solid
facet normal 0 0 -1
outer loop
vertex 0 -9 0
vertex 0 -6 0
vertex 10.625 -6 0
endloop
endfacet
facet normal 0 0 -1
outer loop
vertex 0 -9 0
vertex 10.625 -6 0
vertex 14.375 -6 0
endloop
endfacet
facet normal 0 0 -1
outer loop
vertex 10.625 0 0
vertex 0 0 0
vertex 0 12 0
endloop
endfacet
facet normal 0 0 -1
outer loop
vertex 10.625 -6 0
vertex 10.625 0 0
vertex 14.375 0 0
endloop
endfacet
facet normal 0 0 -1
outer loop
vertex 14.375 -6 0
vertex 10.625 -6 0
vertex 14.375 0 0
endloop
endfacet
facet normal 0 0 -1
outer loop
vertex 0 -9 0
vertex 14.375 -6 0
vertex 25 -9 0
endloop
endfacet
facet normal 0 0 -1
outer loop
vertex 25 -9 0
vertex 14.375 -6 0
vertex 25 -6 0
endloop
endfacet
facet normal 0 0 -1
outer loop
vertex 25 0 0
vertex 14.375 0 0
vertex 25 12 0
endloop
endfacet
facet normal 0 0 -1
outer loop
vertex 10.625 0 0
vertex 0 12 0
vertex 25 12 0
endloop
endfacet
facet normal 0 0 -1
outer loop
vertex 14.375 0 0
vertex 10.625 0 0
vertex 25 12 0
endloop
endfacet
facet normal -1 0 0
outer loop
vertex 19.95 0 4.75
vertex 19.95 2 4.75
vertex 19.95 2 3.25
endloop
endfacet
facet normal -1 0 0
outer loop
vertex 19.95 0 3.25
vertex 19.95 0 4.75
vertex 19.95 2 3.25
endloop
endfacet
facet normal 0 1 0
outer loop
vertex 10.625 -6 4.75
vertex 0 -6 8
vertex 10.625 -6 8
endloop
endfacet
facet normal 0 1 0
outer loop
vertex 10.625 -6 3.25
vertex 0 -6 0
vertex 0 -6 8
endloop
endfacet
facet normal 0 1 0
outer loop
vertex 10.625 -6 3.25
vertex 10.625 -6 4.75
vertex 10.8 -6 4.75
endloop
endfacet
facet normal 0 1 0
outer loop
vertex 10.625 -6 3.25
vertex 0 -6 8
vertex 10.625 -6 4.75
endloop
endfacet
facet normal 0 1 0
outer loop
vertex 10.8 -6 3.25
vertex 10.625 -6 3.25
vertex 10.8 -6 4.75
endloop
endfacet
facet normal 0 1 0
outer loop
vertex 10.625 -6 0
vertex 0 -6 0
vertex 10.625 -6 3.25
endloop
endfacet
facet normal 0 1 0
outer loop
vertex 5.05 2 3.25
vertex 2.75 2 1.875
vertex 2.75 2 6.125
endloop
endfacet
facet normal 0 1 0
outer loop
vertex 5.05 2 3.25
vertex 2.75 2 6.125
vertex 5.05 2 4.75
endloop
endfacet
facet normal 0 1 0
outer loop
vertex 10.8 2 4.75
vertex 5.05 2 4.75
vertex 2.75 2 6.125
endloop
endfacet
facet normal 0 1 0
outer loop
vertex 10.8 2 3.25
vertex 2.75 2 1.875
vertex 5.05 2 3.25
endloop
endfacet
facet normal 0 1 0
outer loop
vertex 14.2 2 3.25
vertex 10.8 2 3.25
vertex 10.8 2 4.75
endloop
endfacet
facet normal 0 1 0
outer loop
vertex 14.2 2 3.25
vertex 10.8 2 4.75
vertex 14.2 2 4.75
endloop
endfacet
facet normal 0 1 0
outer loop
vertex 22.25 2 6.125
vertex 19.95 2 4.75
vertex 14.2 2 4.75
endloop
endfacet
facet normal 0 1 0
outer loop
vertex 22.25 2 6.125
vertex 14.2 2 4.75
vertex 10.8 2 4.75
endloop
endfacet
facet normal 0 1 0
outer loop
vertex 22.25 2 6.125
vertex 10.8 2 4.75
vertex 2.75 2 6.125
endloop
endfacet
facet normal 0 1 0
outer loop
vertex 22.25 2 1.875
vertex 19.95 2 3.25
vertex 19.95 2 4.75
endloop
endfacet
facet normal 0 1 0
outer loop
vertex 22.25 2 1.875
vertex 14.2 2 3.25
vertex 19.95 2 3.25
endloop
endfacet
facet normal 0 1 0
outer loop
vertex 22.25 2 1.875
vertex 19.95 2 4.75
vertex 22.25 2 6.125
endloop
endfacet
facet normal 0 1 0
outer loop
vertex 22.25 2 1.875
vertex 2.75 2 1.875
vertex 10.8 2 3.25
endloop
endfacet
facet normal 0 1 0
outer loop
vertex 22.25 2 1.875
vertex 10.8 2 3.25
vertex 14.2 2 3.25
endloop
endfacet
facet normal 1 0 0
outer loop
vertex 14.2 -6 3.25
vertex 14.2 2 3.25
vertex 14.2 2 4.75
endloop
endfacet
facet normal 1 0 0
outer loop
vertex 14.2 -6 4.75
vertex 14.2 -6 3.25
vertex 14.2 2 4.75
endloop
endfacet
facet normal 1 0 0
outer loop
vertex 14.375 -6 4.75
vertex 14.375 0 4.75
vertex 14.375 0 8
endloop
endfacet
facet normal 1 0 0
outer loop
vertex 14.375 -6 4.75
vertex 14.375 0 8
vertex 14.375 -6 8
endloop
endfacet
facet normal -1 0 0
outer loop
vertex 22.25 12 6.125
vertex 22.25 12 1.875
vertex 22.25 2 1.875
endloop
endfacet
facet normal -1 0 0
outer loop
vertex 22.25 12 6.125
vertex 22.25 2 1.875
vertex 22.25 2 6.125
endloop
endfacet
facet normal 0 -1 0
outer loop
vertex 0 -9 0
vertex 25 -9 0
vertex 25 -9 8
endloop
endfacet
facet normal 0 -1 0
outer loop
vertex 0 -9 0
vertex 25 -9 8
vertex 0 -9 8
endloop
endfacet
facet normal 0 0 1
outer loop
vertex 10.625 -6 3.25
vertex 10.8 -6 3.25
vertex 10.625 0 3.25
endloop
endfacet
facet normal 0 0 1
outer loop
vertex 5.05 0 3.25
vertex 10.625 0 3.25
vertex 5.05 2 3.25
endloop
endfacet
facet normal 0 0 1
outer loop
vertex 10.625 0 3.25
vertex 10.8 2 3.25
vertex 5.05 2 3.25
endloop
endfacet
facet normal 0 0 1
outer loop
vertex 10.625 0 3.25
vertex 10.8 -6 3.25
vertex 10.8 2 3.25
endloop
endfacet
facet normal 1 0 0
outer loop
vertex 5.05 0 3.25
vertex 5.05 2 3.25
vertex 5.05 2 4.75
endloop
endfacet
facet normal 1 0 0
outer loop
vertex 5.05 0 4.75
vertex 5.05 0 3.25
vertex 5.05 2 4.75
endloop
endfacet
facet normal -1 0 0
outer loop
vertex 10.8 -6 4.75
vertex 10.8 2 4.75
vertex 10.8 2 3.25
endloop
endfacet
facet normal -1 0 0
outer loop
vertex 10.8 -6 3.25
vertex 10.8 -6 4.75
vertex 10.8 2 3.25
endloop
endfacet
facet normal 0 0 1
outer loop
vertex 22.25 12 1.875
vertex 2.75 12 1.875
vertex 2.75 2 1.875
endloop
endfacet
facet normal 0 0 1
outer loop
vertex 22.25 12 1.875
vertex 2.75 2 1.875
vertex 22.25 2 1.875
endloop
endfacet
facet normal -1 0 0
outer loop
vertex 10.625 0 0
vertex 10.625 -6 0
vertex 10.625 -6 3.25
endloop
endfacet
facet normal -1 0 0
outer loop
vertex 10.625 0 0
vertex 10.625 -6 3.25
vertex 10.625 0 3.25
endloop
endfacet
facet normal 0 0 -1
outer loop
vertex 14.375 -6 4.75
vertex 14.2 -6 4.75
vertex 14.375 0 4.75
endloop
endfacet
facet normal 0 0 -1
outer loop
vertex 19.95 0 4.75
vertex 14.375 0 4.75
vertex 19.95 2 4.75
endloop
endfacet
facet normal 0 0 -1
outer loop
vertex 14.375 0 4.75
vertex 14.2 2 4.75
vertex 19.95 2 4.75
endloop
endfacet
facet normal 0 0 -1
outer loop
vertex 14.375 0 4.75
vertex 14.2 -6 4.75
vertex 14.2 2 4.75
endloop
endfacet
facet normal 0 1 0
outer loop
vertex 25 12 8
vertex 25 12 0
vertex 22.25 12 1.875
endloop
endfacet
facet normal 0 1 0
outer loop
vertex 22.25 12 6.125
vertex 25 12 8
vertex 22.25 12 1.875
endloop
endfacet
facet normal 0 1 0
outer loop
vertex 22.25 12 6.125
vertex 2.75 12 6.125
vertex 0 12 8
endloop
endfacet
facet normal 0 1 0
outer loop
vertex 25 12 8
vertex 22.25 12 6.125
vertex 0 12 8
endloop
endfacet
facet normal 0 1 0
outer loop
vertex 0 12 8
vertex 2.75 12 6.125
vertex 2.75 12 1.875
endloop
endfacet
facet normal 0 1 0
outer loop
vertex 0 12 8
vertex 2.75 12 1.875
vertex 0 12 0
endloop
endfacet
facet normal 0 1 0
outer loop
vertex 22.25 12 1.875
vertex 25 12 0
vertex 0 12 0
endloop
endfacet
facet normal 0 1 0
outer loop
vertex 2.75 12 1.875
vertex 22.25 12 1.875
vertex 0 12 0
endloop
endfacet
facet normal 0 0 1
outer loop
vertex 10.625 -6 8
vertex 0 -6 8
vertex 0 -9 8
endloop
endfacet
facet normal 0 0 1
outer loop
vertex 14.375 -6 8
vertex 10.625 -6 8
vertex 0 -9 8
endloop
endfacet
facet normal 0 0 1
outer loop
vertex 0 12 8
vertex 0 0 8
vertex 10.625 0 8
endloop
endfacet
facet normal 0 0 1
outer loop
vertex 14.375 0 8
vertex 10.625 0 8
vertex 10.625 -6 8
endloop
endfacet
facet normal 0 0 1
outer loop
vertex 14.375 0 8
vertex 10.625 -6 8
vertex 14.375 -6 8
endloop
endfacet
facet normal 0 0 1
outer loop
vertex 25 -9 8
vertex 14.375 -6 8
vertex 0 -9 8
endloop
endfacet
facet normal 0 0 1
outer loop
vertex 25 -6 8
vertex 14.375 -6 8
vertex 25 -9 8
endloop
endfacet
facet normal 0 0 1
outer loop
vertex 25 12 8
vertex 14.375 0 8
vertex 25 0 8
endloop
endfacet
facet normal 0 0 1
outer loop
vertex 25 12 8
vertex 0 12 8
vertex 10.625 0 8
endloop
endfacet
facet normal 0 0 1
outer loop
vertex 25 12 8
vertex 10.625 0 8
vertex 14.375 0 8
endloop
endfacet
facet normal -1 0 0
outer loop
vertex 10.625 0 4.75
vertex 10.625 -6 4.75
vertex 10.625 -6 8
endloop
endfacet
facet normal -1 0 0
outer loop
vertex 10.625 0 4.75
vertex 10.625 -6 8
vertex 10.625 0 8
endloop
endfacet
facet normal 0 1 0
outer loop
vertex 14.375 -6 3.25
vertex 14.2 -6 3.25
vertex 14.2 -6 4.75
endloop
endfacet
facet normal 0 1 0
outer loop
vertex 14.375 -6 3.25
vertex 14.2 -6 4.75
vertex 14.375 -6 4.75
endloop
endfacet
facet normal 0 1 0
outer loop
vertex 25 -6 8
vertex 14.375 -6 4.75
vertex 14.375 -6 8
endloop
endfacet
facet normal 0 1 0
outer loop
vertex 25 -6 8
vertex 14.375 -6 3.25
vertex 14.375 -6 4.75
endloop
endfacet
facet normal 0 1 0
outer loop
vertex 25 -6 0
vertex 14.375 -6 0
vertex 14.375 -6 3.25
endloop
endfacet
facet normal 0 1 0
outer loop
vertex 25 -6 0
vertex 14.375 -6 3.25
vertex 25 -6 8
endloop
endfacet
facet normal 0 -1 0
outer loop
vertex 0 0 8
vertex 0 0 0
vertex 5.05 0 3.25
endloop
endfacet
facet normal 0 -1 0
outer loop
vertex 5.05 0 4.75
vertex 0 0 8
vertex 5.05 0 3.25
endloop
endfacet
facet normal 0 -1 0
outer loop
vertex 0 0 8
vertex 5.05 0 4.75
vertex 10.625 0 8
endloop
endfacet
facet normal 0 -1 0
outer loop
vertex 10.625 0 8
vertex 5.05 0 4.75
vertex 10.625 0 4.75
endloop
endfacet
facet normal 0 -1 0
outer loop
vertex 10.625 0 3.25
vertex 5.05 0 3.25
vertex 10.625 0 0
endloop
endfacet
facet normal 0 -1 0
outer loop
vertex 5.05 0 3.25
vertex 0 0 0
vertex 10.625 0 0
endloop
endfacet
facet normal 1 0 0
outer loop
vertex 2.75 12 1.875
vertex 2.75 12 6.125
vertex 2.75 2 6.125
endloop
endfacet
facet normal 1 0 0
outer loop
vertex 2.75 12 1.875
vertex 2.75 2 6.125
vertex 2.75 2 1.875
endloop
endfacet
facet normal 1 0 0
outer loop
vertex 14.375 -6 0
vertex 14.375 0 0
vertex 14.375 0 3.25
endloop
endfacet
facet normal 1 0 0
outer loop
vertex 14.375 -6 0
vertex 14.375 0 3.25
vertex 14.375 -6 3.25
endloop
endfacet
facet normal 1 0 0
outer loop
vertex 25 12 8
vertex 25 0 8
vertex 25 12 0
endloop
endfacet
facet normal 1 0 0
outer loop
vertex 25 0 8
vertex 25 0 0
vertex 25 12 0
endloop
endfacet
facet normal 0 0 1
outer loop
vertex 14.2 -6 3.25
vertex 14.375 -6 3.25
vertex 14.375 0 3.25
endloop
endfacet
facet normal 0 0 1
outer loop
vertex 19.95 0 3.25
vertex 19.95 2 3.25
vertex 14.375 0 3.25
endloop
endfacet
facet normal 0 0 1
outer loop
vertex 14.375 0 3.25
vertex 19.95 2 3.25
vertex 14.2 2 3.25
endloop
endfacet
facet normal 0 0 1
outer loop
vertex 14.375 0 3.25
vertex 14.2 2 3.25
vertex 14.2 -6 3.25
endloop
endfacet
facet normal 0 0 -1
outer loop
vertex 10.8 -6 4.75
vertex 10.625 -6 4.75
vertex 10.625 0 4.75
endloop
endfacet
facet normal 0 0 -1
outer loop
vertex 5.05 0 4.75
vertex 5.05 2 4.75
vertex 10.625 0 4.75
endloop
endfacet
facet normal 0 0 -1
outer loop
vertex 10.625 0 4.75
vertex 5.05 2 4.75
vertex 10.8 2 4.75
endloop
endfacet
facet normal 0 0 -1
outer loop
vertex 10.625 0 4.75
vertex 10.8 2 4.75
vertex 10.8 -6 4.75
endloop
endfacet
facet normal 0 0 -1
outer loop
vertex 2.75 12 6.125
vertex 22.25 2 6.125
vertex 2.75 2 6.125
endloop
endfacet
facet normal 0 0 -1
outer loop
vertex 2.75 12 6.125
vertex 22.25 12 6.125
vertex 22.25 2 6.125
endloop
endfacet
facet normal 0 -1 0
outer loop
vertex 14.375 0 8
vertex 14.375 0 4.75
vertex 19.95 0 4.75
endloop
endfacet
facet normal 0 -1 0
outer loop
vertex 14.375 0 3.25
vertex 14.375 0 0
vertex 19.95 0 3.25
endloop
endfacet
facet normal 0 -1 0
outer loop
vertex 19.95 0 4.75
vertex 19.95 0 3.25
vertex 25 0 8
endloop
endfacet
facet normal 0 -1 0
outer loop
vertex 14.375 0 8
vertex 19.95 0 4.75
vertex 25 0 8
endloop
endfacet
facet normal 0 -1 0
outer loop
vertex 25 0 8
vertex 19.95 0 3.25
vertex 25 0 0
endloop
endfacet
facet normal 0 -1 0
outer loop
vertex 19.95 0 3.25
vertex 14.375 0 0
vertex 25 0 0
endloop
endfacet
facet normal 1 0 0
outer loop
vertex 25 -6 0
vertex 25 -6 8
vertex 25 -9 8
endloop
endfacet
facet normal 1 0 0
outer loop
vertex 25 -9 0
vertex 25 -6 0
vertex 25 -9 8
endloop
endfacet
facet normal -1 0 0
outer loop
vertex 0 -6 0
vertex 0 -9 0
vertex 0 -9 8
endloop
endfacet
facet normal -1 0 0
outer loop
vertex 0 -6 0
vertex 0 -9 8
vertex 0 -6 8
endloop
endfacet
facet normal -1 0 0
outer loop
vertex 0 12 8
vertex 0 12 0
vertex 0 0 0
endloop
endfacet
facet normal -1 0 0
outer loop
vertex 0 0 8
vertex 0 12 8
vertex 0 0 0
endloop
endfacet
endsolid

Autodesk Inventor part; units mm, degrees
ref_plane "YZ Plane" through (0, 0, 0) normal (1, 0, 0) x (0, 1, 0)
ref_plane "XZ Plane" through (0, 0, 0) normal (0, 1, 0) x (-1, 0, 0)
ref_plane "XY Plane" through (0, 0, 0) normal (0, 0, 1) x (1, 0, 0)
sketch "Sketch1" plane through (0, 0, 0) normal (0, 0, 1) x (1, 0, 0)
  line L0 (0, 0) -> (25, 0)
  line L1 (25, 0) -> (25, 12)
  line L2 (25, 12) -> (0, 12)
  line L3 (0, 12) -> (0, 0)
  line L4 (10.625, 0) -> (14.375, 0)
  line L5 (14.375, 0) -> (14.375, -6)
  line L6 (14.375, -6) -> (10.625, -6) construction
  line L7 (10.625, -6) -> (10.625, 0)
  line L8 (0, -6) -> (25, -6)
  line L9 (25, -6) -> (25, -9)
  line L10 (25, -9) -> (0, -9)
  line L11 (0, -9) -> (0, -6)
  point P0 (14.375, 0)
  dimension "d0" = 25
  dimension "d1" = 12
  dimension "d2" = 6
  dimension "d3" = 3.75
  dimension "d4" = 10.625
  dimension "d28" = 0
  dimension "d29" = 3
extrude "Extrusion1" add sketch "Sketch1" along normal blind 8
sketch "Sketch2" plane through (0, 12, 0) normal (0, 1, 0) x (1, 0, 0)
  line L0 (0, 0) -> (10.625, 0) projected
  line L1 (0, 0) -> (25, 0)
  line L2 (25, 0) -> (25, -8)
  line L3 (25, -8) -> (0, -8)
  line L4 (0, -8) -> (0, 0)
  line L5 (2.75, -1.875) -> (22.25, -1.875)
  line L6 (22.25, -1.875) -> (22.25, -6.125)
  line L7 (22.25, -6.125) -> (2.75, -6.125)
  line L8 (2.75, -6.125) -> (2.75, -1.875)
  line L9 (5.05, -4.75) -> (10.8, -4.75)
  line L10 (10.8, -4.75) -> (10.8, -3.25)
  line L11 (10.8, -3.25) -> (5.05, -3.25)
  line L12 (5.05, -3.25) -> (5.05, -4.75)
  line L13 (14.2, -4.75) -> (19.95, -4.75)
  line L14 (19.95, -4.75) -> (19.95, -3.25)
  line L15 (19.95, -3.25) -> (14.2, -3.25)
  line L16 (14.2, -3.25) -> (14.2, -4.75)
  line L17 (2.95, -6) -> (22.05, -6) construction
  line L18 (22.05, -6) -> (22.05, -2) construction
  line L19 (22.05, -2) -> (2.95, -2) construction
  line L20 (2.95, -2) -> (2.95, -6) construction
  dimension "d7" = 25
  dimension "d8" = 8
  dimension "d9" = 19.5
  dimension "d10" = 4.25
  dimension "d11" = 1.875
  dimension "d12" = 2.75
  dimension "d13" = 1.5
  dimension "d14" = 19.1
  dimension "d15" = 4
  dimension "d16" = 2.95
  dimension "d17" = 2
  dimension "d18" = 2.1
  dimension "d20" = 2.1
  dimension "d21" = 1.25
  dimension "d22" = 5.75
  dimension "d23" = 5.75
extrude "Extrusion2" cut sketch "Sketch2" against normal blind 10 contours L5 L6 L7 L8 | L12 L11 L10 L9 | L16 L15 L14 L13
extrude "Extrusion3" cut sketch "Sketch2" against normal blind 18 contours L12 L11 L10 L9 | L16 L15 L14 L13
properties part number "fusebox"
